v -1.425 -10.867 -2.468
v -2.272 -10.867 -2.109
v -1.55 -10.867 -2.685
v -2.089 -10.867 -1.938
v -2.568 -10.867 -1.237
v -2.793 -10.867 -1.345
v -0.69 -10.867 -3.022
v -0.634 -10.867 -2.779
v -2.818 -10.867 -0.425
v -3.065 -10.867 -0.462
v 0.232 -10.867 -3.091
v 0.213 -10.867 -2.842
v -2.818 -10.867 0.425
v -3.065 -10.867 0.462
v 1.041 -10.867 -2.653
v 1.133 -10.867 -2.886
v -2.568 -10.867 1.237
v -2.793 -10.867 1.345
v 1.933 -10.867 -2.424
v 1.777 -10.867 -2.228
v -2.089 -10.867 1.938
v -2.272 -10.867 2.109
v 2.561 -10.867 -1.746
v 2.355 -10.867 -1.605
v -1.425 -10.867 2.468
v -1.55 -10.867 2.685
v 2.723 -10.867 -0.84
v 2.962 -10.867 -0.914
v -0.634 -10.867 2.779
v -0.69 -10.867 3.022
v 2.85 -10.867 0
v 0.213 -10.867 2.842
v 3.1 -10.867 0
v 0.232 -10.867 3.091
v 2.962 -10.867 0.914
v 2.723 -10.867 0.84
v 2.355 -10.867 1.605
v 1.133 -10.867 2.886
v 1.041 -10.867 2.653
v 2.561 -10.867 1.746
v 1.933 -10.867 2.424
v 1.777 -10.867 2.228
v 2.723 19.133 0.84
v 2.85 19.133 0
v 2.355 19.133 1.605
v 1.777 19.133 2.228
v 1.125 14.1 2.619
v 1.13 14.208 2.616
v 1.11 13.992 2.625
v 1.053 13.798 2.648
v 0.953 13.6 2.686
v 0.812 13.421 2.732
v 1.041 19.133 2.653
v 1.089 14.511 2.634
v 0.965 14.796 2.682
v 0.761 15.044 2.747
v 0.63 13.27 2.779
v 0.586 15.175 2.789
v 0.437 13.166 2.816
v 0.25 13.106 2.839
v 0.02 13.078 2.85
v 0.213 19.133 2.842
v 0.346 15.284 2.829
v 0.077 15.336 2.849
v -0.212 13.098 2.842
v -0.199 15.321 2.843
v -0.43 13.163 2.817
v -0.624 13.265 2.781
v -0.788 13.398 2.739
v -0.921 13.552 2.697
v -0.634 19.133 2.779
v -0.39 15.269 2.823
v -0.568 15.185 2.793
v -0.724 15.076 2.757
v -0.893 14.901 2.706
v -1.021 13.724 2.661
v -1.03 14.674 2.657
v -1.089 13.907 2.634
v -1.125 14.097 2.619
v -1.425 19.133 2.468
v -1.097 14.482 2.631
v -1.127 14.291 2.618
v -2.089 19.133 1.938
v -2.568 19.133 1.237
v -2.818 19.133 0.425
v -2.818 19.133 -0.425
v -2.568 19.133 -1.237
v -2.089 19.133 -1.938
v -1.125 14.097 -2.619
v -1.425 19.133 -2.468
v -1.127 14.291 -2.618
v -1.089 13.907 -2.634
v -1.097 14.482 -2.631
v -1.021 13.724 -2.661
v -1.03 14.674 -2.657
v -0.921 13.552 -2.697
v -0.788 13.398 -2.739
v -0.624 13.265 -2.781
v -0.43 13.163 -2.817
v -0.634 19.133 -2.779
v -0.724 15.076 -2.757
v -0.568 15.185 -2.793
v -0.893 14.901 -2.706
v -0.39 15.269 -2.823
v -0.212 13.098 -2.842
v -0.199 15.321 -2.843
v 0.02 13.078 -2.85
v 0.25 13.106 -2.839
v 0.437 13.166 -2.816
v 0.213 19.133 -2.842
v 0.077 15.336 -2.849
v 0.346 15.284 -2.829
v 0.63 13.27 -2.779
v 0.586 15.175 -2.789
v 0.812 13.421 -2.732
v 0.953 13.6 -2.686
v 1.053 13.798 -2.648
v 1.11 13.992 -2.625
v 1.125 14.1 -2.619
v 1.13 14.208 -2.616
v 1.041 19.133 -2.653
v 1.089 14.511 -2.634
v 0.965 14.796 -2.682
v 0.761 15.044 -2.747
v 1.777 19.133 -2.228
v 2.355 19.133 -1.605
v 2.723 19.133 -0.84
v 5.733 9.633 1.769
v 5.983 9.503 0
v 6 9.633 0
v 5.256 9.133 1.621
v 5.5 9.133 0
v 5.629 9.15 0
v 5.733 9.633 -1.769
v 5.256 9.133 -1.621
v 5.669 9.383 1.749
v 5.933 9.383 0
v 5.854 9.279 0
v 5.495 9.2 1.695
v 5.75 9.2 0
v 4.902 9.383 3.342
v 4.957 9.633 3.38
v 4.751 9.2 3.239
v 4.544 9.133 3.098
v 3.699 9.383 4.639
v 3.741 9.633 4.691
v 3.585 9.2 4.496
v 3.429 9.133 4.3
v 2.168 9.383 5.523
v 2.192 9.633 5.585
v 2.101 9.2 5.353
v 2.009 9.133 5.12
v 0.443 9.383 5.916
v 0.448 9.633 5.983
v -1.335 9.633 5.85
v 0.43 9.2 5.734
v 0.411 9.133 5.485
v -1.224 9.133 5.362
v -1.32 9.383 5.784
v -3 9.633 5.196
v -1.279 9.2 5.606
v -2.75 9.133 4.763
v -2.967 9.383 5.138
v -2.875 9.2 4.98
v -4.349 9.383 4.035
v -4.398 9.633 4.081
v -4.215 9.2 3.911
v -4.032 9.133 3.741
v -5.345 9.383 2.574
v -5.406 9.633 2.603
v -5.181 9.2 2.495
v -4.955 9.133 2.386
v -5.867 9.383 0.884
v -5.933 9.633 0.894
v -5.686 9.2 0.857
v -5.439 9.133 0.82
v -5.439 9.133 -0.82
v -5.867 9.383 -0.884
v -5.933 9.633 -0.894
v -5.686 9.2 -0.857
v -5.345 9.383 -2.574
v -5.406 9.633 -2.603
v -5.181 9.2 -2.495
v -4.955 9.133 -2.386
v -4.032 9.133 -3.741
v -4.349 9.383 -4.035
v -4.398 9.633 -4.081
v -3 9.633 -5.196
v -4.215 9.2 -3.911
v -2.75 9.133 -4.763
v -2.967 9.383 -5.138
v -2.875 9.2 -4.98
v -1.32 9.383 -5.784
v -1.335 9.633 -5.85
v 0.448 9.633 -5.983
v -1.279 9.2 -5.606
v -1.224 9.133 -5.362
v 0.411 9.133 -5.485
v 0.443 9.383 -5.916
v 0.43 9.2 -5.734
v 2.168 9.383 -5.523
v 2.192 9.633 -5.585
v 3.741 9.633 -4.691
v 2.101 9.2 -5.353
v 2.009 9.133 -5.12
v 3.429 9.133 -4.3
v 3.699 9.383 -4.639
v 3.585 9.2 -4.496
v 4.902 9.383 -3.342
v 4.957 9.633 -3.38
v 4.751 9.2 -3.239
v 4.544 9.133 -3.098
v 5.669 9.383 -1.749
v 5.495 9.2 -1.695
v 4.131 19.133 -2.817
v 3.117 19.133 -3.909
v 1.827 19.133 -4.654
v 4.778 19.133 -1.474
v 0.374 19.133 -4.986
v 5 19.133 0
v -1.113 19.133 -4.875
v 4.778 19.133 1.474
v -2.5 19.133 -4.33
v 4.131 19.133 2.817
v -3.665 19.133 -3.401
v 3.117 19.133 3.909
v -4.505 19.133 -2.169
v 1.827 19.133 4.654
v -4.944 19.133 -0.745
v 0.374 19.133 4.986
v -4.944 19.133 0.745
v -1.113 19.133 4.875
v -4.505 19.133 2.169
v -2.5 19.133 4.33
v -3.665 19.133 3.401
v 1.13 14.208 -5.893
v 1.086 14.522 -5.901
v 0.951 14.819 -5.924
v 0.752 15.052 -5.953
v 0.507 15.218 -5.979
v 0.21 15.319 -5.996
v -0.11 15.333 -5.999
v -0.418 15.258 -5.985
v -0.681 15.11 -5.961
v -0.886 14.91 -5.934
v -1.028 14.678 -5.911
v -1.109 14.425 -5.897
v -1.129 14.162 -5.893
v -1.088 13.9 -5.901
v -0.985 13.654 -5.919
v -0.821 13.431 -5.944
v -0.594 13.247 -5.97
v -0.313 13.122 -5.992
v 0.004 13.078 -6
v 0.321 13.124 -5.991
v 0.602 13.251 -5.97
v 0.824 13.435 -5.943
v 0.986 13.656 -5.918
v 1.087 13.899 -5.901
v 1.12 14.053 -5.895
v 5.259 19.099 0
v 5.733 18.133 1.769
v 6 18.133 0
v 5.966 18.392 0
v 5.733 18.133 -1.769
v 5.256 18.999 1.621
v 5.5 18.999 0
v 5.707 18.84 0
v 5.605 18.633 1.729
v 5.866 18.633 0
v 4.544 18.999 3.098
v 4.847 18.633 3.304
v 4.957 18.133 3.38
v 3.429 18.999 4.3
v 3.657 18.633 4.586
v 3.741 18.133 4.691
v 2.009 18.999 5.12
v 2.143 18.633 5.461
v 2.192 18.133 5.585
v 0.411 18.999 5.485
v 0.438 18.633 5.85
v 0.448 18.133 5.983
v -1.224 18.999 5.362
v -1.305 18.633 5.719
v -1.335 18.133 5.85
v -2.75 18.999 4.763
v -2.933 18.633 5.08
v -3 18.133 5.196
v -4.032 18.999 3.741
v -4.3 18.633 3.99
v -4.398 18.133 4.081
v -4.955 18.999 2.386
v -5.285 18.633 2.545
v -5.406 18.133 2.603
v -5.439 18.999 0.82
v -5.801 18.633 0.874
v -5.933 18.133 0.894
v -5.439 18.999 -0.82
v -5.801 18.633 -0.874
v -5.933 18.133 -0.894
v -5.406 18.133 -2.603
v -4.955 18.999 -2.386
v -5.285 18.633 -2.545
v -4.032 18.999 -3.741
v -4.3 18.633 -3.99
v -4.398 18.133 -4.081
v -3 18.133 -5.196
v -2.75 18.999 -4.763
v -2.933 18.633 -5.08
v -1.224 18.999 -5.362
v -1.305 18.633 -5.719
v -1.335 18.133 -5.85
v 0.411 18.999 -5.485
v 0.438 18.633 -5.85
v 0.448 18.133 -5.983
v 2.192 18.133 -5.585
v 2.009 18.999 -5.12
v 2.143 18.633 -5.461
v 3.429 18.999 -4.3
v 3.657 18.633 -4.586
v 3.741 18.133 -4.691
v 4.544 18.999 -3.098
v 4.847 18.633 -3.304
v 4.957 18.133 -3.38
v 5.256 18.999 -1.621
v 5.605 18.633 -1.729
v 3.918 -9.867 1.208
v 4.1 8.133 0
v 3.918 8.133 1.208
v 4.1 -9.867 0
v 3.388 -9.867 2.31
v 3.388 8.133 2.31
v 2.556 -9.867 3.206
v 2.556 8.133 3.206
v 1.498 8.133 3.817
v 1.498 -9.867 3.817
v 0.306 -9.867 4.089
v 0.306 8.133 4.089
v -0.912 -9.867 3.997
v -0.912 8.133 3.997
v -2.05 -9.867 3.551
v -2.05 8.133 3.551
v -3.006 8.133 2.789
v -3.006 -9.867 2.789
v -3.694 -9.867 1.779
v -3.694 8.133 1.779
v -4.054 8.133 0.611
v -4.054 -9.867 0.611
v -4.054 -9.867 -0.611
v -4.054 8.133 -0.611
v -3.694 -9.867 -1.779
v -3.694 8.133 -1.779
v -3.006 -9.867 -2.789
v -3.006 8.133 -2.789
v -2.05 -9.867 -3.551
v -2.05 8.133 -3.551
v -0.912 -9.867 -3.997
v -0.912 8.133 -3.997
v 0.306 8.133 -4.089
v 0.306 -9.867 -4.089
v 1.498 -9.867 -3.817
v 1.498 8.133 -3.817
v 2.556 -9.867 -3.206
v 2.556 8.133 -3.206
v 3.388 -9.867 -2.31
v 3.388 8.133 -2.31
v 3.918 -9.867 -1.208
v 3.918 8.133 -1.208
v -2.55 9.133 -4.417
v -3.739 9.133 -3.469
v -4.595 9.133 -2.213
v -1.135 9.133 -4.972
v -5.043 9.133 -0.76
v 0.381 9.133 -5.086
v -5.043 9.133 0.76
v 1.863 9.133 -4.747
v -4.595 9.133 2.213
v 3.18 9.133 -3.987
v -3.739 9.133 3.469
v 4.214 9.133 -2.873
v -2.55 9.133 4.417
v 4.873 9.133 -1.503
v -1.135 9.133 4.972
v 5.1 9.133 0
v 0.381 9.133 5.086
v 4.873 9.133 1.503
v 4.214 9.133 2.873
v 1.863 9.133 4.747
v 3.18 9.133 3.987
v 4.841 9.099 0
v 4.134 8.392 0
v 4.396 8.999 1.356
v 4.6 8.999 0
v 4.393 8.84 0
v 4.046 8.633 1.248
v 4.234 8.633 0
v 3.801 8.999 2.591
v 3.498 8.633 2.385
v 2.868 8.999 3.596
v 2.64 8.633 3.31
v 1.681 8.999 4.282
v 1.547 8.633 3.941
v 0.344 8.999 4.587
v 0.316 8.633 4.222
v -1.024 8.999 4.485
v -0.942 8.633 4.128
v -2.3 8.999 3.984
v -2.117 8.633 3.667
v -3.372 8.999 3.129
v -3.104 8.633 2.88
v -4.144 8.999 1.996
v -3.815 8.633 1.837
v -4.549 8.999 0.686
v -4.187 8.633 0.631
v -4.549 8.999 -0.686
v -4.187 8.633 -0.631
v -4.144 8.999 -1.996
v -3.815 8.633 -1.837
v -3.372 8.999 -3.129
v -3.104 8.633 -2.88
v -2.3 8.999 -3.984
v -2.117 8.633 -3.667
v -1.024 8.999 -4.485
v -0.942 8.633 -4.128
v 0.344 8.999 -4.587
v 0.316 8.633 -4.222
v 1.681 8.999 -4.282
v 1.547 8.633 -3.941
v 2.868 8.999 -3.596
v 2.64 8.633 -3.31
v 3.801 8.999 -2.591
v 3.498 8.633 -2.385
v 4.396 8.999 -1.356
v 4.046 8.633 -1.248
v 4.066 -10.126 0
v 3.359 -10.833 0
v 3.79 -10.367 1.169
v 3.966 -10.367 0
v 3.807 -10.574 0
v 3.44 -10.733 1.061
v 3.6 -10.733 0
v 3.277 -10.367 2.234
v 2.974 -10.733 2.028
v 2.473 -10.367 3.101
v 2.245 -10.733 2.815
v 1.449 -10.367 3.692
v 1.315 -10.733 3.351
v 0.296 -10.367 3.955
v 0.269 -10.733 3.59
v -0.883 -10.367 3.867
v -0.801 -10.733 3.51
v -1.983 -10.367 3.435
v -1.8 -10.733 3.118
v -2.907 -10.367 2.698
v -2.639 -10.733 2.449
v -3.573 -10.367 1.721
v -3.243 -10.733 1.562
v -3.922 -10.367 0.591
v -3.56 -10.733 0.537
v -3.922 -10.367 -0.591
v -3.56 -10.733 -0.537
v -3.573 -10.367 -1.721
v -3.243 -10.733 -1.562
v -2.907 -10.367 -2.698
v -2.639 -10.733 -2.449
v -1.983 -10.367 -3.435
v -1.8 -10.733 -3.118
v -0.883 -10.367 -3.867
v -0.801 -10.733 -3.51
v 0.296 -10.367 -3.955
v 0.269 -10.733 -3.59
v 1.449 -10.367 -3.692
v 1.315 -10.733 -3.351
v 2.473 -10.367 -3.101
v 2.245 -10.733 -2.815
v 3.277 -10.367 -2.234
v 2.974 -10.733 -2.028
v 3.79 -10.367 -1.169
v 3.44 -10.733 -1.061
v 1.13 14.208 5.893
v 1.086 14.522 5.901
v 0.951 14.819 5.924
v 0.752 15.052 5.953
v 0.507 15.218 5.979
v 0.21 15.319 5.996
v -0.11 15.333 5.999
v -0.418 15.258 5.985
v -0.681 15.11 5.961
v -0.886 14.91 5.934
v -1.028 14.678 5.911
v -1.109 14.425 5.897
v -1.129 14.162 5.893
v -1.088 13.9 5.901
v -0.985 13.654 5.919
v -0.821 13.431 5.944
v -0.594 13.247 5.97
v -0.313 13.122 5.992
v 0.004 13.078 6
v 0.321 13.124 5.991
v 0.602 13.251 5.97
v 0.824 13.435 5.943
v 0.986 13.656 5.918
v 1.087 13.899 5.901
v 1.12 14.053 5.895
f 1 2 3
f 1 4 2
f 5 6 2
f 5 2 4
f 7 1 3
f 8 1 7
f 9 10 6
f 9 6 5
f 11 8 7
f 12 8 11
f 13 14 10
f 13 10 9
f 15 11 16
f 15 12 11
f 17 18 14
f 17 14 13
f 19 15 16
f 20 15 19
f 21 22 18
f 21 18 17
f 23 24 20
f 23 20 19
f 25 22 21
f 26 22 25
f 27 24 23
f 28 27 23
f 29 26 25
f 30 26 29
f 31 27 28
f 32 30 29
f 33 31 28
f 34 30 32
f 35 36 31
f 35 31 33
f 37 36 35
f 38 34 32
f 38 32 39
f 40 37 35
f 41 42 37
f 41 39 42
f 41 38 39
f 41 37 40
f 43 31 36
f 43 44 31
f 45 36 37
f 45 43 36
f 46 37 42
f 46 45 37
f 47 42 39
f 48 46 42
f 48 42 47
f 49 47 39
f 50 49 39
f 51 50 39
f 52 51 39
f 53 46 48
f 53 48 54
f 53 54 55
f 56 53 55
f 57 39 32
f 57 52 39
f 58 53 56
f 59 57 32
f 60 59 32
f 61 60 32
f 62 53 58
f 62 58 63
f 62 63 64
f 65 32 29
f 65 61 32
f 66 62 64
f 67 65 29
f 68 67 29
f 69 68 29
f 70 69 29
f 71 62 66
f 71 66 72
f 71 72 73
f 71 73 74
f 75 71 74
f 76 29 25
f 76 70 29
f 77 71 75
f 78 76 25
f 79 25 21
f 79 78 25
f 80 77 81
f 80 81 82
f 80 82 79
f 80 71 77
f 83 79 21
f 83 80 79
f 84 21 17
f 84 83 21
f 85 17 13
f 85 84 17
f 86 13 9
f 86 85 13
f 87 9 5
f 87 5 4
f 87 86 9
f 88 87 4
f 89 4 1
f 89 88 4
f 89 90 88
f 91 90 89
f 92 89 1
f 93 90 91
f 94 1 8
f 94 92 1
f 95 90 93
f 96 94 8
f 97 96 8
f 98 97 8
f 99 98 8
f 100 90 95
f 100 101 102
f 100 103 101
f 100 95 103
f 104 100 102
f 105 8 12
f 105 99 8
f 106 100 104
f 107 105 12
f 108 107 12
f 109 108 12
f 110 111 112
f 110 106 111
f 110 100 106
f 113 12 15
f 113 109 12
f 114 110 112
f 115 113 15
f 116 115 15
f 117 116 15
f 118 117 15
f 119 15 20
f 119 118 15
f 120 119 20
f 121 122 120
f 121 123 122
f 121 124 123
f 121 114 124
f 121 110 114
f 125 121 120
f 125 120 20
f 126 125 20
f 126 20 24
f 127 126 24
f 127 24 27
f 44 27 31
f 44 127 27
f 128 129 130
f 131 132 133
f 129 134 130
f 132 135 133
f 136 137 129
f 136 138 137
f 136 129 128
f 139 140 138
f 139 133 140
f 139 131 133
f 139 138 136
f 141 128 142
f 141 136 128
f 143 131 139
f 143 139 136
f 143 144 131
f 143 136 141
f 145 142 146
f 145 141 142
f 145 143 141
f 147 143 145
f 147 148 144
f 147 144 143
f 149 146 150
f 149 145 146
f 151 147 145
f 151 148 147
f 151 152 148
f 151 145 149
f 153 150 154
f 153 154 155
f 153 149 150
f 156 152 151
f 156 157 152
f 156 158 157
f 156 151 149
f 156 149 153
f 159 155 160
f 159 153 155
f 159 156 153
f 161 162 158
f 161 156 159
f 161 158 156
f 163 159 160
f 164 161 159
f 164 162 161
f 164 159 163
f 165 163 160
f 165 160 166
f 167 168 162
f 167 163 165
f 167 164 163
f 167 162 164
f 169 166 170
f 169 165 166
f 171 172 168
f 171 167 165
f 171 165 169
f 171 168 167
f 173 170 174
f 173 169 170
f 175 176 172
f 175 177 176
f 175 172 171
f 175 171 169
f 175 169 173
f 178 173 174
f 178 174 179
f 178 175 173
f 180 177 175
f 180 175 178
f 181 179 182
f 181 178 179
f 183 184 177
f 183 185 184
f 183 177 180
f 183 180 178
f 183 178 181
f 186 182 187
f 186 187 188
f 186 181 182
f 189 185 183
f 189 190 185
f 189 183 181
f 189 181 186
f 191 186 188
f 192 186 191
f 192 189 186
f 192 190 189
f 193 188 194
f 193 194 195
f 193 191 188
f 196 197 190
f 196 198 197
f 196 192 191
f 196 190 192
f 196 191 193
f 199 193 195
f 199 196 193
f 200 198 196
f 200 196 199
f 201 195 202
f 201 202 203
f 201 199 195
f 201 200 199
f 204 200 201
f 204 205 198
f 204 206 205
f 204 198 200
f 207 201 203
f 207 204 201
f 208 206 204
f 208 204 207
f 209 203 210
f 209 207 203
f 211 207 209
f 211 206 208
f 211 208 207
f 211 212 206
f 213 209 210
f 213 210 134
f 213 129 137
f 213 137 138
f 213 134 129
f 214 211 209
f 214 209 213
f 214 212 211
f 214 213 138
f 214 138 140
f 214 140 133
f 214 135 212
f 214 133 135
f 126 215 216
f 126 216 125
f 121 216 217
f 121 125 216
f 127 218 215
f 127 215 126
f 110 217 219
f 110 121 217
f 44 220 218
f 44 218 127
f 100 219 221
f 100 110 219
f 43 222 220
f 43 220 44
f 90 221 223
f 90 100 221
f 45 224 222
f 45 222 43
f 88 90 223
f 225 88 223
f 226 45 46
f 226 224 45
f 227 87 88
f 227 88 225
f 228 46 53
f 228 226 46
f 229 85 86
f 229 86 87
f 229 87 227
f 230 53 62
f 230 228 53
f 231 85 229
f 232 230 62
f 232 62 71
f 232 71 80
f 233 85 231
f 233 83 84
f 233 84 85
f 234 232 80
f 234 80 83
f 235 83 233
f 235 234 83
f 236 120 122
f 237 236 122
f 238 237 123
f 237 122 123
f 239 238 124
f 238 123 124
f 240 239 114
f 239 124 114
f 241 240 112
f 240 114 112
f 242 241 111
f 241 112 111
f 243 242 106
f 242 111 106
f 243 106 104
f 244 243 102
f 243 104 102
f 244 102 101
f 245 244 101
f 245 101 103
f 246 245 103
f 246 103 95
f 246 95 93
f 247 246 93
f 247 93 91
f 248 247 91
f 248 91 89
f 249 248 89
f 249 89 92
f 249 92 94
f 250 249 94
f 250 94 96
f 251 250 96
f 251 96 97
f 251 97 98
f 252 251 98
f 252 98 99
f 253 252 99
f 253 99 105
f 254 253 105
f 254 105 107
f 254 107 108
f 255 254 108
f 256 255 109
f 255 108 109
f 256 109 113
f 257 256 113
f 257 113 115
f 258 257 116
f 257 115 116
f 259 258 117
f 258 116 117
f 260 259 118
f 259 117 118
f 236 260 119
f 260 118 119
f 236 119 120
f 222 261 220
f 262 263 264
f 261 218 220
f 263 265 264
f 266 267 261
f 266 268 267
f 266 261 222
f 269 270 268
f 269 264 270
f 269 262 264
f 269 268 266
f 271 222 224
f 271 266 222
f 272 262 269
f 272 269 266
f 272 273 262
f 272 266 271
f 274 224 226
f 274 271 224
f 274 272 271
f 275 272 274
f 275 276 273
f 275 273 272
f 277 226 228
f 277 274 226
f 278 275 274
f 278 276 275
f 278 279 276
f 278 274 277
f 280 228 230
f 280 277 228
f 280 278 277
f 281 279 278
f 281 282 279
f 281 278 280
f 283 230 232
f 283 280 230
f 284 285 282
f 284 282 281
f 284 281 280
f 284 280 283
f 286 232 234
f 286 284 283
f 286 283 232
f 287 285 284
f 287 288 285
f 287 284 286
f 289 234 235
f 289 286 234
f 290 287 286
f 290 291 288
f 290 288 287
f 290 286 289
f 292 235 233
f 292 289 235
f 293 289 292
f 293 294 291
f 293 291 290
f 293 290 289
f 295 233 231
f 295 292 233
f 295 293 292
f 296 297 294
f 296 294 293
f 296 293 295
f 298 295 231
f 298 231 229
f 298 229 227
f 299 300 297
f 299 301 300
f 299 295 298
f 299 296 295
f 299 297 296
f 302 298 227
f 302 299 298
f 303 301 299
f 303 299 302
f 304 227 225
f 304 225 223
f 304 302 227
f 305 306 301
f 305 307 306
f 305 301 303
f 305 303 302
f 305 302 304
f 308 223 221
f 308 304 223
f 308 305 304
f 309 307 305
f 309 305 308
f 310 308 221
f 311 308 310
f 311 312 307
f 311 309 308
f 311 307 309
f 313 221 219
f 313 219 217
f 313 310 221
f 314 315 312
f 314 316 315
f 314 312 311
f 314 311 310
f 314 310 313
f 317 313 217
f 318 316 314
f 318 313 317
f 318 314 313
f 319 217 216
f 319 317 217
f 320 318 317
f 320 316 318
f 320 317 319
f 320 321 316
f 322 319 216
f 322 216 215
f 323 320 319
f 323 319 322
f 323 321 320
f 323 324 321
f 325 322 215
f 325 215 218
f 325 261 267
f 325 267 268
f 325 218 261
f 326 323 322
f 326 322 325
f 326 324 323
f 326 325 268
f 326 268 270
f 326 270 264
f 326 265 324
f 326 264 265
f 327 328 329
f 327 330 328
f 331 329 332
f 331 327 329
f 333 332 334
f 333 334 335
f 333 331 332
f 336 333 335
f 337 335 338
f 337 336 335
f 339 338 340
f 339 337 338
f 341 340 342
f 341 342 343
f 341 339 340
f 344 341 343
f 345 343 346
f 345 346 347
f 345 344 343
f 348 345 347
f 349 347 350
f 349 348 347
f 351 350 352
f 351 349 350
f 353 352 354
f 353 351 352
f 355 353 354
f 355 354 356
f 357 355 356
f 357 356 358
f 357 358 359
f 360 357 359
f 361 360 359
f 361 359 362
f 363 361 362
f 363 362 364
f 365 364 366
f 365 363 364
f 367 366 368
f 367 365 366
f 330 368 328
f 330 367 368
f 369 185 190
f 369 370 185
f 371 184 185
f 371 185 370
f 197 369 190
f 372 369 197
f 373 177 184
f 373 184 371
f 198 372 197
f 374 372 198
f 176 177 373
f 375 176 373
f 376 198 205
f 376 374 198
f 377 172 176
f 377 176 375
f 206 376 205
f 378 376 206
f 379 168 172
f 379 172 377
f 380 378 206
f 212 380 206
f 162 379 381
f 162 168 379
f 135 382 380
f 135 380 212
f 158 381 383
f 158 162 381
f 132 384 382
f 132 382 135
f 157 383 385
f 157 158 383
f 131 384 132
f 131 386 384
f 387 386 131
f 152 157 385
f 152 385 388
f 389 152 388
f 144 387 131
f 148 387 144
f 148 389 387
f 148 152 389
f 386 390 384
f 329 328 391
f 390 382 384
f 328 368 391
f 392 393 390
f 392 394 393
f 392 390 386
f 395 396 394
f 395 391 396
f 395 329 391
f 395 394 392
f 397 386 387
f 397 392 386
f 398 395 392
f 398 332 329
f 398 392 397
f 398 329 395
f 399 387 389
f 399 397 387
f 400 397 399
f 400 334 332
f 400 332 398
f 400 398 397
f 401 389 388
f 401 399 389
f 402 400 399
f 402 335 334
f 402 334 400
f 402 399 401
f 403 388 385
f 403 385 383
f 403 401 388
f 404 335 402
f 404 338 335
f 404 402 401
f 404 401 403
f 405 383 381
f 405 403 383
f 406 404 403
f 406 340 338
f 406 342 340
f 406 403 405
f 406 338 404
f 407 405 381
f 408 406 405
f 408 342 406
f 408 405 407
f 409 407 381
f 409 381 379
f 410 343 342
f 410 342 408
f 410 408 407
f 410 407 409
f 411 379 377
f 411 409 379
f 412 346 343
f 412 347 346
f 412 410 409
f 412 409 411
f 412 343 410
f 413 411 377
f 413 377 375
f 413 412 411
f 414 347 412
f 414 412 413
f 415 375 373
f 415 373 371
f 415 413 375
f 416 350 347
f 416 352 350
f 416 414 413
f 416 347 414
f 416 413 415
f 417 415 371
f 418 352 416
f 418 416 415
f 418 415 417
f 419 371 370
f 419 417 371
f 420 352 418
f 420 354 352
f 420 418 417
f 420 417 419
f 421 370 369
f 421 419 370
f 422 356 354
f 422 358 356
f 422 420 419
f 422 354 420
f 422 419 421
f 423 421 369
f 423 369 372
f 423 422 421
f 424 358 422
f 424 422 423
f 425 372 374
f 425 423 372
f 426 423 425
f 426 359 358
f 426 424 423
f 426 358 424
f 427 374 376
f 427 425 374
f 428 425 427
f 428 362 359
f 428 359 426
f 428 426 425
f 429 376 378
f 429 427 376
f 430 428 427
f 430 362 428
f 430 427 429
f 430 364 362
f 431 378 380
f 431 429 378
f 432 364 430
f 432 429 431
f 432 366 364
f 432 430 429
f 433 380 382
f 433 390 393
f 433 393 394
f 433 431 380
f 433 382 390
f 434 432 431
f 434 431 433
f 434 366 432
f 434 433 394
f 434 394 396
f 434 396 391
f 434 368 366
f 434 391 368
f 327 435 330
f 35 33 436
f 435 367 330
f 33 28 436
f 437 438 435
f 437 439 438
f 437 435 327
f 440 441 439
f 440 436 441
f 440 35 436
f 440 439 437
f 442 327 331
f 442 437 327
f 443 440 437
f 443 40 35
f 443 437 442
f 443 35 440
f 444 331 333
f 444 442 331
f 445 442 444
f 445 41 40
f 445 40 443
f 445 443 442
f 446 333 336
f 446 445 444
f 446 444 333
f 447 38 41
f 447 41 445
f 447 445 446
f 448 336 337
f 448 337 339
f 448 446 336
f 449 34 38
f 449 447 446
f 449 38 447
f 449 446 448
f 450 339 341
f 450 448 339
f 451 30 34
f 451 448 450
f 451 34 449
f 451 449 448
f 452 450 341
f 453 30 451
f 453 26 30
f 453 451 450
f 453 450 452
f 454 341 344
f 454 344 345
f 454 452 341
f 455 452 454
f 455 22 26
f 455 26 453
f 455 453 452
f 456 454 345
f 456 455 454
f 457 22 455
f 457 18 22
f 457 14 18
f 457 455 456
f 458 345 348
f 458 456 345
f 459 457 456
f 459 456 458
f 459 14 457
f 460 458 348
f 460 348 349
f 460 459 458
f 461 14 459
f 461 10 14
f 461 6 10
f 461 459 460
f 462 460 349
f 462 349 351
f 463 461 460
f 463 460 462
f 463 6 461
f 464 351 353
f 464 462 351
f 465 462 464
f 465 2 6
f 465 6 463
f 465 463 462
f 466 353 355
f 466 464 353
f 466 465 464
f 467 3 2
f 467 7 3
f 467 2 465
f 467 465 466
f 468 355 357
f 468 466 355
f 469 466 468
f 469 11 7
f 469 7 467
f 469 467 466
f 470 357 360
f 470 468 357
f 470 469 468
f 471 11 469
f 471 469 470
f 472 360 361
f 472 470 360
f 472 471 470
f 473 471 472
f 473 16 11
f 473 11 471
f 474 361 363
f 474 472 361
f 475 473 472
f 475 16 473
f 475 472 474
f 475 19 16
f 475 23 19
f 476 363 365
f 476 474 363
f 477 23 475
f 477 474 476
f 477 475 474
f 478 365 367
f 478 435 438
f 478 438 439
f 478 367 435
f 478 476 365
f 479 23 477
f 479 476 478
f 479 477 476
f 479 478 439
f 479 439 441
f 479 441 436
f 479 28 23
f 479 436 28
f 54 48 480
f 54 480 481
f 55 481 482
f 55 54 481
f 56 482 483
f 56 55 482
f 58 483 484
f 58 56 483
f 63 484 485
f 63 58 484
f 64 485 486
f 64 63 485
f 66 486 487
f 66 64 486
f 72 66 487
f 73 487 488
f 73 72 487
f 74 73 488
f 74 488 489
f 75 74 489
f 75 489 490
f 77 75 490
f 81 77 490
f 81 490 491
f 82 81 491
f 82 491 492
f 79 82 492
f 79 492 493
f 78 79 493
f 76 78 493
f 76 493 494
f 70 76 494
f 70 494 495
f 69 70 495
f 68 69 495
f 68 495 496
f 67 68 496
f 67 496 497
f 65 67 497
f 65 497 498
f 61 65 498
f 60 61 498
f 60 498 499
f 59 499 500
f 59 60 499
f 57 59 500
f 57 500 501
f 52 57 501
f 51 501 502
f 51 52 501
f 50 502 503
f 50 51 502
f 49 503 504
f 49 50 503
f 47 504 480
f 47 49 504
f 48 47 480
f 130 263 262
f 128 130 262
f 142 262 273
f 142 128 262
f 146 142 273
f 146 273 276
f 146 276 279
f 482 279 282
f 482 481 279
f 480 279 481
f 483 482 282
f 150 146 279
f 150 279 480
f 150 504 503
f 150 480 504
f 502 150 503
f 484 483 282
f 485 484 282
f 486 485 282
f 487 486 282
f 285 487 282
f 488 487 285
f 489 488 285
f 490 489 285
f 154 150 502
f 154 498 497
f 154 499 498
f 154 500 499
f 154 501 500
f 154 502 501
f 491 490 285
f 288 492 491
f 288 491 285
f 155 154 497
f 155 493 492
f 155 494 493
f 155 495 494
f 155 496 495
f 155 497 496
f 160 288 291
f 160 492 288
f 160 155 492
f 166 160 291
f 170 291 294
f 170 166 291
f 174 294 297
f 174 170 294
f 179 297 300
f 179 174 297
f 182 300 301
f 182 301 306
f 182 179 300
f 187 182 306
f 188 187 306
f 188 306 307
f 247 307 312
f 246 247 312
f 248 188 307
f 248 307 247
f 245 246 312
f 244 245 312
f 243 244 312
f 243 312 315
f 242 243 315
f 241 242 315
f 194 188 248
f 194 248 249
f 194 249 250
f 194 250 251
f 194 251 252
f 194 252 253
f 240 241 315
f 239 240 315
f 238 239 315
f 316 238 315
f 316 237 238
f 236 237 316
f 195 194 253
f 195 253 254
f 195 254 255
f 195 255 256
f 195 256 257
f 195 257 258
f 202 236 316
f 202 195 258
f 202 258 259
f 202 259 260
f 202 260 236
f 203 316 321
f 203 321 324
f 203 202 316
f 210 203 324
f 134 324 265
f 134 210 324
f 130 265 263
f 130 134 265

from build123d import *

# Parameters (mm, degrees)
CUT_EXTRUDE1_DEPTH      = 10
CUT_EXTRUDE1_DEPTH_BACK = 10
SKETCH2_R               = 1.1303


with BuildPart() as part:
    # Sketch1 → Revolve1 (revolve)
    with BuildSketch(Plane.XY):
        with BuildLine():
            Line((2.85, 19.132875201), (5, 19.132875201))
            ThreePointArc((5, 19.132875201), (5.707106781, 18.839981982), (6, 18.132875201))
            Line((6, 18.132875201), (6, 9.632875201))
            ThreePointArc((6, 9.632875201), (5.853553391, 9.27932181), (5.5, 9.132875201))
            Line((5.5, 9.132875201), (5.1, 9.132875201))
            ThreePointArc((5.1, 9.132875201), (4.392893219, 8.839981982), (4.1, 8.132875201))
            Line((4.1, 8.132875201), (4.1, -9.867124799))
            ThreePointArc((4.1, -9.867124799), (3.807106781, -10.57423158), (3.1, -10.867124799))
            Line((3.1, -10.867124799), (2.85, -10.867124799))
            Line((2.85, -10.867124799), (2.85, 19.132875201))
        make_face()
    revolve(axis=Axis((0, 27.883391117, 0), (0, -1, 0)))

    # Sketch2 → Cut-Extrude1 (cut, two sides: drawn at the far end of the back side and taken through both)
    with BuildSketch(Plane.XY.offset(-CUT_EXTRUDE1_DEPTH_BACK)):
        with Locations((0, 14.207956768)):
            Circle(SKETCH2_R)
    extrude(amount=CUT_EXTRUDE1_DEPTH + CUT_EXTRUDE1_DEPTH_BACK, mode=Mode.SUBTRACT)


solid = part.part
